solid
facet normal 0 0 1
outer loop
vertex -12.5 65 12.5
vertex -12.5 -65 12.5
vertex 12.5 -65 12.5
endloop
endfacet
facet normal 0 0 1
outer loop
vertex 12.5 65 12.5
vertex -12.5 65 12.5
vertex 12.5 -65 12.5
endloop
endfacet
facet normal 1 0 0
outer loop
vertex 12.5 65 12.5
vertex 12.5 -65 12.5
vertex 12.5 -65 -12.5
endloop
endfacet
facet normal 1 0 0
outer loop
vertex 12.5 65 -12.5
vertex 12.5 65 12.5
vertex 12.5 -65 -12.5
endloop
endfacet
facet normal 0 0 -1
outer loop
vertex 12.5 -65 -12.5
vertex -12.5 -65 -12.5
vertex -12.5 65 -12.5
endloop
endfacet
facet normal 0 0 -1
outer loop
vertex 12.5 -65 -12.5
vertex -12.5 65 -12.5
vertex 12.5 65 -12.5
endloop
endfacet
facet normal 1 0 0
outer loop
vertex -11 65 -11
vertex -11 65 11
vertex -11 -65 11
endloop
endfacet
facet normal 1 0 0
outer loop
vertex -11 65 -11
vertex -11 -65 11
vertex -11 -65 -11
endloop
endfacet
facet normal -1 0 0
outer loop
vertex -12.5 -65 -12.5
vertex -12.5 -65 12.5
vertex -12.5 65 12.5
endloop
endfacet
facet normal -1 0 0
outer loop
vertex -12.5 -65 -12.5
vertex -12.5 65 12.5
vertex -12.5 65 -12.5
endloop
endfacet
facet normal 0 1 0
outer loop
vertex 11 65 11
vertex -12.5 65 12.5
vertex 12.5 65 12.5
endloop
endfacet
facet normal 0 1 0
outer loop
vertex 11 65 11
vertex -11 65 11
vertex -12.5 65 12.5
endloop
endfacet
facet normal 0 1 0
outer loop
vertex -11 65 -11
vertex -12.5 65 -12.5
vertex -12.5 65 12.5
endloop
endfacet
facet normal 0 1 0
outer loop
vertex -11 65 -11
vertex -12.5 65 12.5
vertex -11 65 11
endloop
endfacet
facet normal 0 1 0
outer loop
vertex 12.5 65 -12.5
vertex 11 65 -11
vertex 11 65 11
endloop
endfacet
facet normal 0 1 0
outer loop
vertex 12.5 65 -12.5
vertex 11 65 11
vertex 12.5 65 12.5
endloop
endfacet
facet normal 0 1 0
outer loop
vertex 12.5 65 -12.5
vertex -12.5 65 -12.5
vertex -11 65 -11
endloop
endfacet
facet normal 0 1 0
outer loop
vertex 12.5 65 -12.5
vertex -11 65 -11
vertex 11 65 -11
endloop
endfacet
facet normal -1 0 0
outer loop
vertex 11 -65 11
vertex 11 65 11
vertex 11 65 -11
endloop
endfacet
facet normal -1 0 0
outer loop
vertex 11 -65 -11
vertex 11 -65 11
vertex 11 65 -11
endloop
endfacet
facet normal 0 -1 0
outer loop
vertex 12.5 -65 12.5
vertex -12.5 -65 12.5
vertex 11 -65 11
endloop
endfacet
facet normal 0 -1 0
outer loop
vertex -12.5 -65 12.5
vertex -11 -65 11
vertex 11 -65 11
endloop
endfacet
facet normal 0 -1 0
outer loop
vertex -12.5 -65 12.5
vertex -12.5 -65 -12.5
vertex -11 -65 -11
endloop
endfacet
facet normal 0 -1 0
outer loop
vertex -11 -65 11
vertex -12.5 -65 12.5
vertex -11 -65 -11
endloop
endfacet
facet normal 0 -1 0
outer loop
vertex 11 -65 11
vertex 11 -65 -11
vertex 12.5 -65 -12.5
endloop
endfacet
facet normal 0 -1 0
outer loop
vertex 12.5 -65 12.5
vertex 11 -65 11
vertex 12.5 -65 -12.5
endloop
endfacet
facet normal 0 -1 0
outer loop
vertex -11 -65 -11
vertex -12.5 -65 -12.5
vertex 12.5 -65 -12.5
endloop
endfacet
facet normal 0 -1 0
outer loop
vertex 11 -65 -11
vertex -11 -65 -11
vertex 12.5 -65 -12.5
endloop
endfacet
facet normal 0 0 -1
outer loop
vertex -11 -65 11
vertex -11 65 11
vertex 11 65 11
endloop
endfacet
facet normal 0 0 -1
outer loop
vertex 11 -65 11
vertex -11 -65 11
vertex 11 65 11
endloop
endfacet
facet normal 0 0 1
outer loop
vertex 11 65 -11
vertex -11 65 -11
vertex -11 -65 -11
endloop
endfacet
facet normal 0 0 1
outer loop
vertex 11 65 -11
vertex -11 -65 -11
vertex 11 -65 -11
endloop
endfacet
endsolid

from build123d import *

# Parameters (mm, degrees)
BOSS_EXTRUDE1_DEPTH      = 65
BOSS_EXTRUDE1_DEPTH_BACK = 65
SKETCH1_W                = 25
SKETCH1_H                = 25
SKETCH1_W_2              = 22
SKETCH1_H_2              = 22


with BuildPart() as part:
    # Sketch1 → Boss-Extrude1 (new, two sides: drawn at the far end of the back side and taken through both)
    with BuildSketch(Plane(origin=(0, 0, 0), x_dir=(1, 0, 0), z_dir=(0, 1, 0)).offset(-BOSS_EXTRUDE1_DEPTH_BACK)):
        Rectangle(SKETCH1_W, SKETCH1_H)
        Rectangle(SKETCH1_W_2, SKETCH1_H_2, mode=Mode.SUBTRACT)
    extrude(amount=BOSS_EXTRUDE1_DEPTH + BOSS_EXTRUDE1_DEPTH_BACK)


solid = part.part
